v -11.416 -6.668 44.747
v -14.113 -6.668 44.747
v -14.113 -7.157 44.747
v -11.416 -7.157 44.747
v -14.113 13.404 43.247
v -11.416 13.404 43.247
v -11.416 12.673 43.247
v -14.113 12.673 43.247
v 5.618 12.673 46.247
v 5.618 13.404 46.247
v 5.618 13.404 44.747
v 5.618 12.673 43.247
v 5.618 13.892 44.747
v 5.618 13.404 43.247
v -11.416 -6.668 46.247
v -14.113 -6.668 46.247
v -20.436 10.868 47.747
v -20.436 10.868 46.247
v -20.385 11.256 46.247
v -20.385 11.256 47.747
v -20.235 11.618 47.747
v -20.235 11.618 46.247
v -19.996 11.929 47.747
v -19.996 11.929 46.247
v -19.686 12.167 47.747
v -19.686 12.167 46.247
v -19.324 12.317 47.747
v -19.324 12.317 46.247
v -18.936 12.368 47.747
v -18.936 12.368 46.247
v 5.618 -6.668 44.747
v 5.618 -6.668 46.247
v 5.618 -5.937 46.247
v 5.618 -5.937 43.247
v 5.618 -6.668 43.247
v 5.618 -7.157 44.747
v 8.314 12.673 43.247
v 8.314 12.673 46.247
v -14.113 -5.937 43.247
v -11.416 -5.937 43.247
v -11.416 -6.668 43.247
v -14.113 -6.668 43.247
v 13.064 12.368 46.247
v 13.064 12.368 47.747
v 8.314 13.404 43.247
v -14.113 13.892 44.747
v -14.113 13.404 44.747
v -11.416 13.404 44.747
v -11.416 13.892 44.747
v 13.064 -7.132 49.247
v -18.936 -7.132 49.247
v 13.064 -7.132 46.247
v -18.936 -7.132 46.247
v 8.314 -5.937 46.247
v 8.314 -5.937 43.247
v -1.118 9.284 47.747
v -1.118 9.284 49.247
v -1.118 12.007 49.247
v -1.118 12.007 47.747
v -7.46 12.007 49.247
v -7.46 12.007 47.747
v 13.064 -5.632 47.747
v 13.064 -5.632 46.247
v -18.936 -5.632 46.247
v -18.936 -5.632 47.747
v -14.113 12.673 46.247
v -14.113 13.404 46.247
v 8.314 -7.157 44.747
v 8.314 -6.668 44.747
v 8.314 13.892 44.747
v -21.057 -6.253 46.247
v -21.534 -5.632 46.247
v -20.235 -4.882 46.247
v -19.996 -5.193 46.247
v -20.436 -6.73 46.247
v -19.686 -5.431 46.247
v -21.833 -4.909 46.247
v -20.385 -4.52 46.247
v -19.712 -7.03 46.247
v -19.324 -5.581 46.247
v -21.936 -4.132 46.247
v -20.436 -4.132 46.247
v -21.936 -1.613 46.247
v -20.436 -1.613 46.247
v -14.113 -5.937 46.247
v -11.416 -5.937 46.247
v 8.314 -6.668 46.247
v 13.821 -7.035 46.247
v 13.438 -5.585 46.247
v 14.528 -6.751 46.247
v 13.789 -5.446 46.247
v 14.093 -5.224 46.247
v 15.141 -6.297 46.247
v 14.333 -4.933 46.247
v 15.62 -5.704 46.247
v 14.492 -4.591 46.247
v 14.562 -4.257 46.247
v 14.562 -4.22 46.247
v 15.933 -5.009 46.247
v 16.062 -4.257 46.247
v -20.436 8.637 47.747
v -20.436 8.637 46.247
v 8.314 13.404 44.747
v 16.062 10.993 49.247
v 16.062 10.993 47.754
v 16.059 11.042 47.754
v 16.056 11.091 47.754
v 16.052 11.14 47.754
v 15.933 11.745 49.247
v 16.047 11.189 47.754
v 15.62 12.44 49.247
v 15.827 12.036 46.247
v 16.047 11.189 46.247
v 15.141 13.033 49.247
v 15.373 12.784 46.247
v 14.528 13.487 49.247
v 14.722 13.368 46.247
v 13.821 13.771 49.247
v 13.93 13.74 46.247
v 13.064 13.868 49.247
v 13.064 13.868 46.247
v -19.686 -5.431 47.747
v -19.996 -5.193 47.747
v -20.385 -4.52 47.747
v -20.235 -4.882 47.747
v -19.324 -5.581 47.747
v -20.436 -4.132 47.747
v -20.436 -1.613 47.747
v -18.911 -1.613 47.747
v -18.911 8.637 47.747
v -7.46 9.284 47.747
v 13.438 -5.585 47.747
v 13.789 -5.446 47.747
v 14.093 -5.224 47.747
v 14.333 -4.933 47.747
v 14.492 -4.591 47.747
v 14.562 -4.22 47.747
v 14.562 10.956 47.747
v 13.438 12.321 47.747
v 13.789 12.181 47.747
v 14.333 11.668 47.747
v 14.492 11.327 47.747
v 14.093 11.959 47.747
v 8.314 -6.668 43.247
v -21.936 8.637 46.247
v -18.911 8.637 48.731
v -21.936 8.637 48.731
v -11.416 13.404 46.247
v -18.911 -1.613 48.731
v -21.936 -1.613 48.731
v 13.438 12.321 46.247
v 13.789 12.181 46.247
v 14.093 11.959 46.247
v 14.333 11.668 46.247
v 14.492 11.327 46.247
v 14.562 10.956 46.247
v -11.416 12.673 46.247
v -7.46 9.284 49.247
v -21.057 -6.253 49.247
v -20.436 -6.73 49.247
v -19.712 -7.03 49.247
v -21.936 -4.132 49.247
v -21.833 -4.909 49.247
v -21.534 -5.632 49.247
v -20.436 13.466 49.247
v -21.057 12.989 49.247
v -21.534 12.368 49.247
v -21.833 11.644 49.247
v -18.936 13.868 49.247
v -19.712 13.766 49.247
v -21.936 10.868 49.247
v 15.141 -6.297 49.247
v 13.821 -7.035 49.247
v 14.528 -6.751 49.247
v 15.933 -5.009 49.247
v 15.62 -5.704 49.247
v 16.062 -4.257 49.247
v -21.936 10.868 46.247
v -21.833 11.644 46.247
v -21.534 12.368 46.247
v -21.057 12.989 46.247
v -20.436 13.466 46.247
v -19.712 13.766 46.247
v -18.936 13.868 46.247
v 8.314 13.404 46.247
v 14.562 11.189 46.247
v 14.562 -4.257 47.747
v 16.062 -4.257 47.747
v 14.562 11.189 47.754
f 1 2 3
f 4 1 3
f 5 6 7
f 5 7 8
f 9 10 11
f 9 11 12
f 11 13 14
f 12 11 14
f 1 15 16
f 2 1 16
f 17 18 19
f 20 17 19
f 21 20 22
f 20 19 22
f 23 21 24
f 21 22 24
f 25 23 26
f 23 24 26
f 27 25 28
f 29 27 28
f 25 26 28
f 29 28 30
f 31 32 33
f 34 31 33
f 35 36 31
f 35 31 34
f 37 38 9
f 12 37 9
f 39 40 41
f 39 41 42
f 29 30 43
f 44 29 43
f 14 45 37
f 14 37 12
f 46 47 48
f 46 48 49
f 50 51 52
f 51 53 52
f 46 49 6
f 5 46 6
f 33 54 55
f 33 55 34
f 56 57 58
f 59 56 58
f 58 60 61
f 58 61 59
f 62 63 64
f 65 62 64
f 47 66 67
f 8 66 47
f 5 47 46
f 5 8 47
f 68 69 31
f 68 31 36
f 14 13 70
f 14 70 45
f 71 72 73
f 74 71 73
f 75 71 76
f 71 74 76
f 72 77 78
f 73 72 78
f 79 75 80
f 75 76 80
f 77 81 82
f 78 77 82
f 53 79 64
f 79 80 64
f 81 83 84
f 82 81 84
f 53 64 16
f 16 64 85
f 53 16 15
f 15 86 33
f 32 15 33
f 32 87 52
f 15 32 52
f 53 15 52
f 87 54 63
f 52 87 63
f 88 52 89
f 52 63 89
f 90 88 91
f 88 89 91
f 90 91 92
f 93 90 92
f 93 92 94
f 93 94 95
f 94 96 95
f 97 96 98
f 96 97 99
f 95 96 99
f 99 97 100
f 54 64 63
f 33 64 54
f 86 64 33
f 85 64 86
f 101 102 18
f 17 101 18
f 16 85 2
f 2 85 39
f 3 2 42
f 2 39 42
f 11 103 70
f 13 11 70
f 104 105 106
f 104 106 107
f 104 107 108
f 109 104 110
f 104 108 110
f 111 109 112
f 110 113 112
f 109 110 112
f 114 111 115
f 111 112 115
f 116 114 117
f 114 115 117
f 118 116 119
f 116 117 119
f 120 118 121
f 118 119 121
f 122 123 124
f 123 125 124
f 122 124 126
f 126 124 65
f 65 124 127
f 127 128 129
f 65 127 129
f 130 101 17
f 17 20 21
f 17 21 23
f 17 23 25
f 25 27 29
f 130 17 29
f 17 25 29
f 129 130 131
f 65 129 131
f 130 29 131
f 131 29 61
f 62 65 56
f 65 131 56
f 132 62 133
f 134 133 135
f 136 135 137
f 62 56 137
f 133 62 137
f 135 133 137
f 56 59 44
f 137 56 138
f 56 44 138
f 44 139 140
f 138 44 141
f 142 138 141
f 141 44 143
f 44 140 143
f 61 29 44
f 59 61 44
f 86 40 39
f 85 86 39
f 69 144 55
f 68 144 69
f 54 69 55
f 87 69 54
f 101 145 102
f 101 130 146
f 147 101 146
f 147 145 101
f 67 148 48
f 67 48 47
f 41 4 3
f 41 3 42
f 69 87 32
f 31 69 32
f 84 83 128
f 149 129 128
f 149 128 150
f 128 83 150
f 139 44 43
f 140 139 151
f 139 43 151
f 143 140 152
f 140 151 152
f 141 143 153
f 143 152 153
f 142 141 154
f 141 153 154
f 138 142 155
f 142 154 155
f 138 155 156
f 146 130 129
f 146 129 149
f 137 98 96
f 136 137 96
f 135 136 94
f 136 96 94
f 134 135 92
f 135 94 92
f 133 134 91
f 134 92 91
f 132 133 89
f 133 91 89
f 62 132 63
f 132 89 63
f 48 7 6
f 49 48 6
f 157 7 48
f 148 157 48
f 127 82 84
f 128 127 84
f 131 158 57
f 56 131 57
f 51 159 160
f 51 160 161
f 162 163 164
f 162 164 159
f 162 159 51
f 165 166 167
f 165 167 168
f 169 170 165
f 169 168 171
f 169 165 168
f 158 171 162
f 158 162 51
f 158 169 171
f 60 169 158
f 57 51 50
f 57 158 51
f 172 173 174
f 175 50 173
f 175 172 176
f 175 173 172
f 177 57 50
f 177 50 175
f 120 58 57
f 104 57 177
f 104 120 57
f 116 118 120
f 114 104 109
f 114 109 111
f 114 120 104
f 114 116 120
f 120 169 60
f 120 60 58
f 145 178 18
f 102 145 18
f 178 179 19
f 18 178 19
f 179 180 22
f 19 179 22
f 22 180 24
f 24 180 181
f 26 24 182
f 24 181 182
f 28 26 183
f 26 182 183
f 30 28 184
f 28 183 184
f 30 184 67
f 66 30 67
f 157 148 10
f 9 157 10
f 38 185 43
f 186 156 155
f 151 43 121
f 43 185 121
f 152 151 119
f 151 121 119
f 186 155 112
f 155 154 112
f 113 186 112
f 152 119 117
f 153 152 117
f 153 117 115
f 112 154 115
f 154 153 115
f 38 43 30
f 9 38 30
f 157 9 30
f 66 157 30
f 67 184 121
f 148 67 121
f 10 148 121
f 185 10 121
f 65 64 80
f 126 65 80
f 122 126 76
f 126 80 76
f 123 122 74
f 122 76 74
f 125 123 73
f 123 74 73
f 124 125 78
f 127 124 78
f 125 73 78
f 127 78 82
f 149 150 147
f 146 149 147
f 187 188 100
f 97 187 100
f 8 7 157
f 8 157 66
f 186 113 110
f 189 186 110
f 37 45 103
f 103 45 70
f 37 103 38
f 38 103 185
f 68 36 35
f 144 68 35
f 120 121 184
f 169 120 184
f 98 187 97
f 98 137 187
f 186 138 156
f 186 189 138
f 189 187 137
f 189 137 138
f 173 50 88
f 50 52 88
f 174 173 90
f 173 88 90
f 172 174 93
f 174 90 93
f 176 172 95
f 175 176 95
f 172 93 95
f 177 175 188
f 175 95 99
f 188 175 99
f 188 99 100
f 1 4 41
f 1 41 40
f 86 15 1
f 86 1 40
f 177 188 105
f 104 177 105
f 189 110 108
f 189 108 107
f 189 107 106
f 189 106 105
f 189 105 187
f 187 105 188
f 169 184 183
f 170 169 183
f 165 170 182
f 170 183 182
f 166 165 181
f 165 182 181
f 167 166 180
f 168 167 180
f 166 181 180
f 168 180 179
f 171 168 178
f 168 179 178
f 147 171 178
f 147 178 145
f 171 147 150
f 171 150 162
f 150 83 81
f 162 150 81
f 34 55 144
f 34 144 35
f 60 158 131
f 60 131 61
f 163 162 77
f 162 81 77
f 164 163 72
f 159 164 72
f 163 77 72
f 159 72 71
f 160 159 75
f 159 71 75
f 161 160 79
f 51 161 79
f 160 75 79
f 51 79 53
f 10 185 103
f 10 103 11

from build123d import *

# Parameters (mm, degrees)
EXTRUDE_1_DEPTH     = 1.5
EXTRUDE_2_DEPTH     = 1.5
CUT_EXTRUDE_2_DEPTH = 1.5
SKETCH_8_W          = 6.342405544
SKETCH_8_H          = 2.722912939
CUT_EXTRUDE_3_DEPTH = 1.5
SKETCH_9_W          = 2.696269273
SKETCH_9_H          = 0.7312398
EXTRUDE_4_DEPTH     = 3
EXTRUDE_6_REACH     = 61.436
CUT_EXTRUDE_4_DEPTH = 17.033846789
SKETCH_6_W          = 3.802870335
SKETCH_6_H          = 10.25
CUT_EXTRUDE_5_DEPTH = 3.024817901


with BuildPart() as part:
    # 草图1 → 凸台-拉伸1 (new body)
    with BuildSketch(Plane.XY.offset(46.24708128)):
        with BuildLine():
            Line((-18.935673231, -7.132078693), (13.064326769, -7.132078693))
            ThreePointArc((13.064326769, -7.132078693), (15.140982735, -6.297142202), (16.061721471, -4.257078693))
            Line((16.061721471, -4.257078693), (16.061721471, 10.992921307))
            ThreePointArc((16.061721471, 10.992921307), (15.140982735, 13.032984817), (13.064326769, 13.867921307))
            Line((13.064326769, 13.867921307), (-18.935673231, 13.867921307))
            ThreePointArc((-18.935673231, 13.867921307), (-21.056993574, 12.989241651), (-21.935673231, 10.867921307))
            Line((-21.935673231, 10.867921307), (-21.935673231, -4.132078693))
            ThreePointArc((-21.935673231, -4.132078693), (-21.056993574, -6.253399036), (-18.935673231, -7.132078693))
        make_face()
        with BuildLine():
            Line((13.064326769, -5.632078693), (-18.935673231, -5.632078693))
            ThreePointArc((-18.935673231, -5.632078693), (-19.996333403, -5.192738865), (-20.435673231, -4.132078693))
            Line((-20.435673231, -4.132078693), (-20.435673231, 10.867921307))
            ThreePointArc((-20.435673231, 10.867921307), (-19.996333403, 11.928581479), (-18.935673231, 12.367921307))
            Line((-18.935673231, 12.367921307), (13.064326769, 12.367921307))
            ThreePointArc((13.064326769, 12.367921307), (14.124986941, 11.928581479), (14.564326769, 10.867921307))
            Line((14.564326769, 10.867921307), (14.564326769, -4.132078693))
            ThreePointArc((14.564326769, -4.132078693), (14.124986941, -5.192738865), (13.064326769, -5.632078693))
        make_face(mode=Mode.SUBTRACT)
    extrude(amount=EXTRUDE_1_DEPTH)

    # 草图4 → 凸台-拉伸2 (add)
    with BuildSketch(Plane.XY.offset(47.74708128)):
        with BuildLine():
            Line((-21.935673231, 10.867921307), (-21.935673231, -4.132078693))
            ThreePointArc((-21.935673231, -4.132078693), (-21.056993574, -6.253399036), (-18.935673231, -7.132078693))
            Line((-18.935673231, -7.132078693), (13.064326769, -7.132078693))
            ThreePointArc((13.064326769, -7.132078693), (15.140982735, -6.297142202), (16.061721471, -4.257078693))
            Line((16.061721471, -4.257078693), (16.061721471, 10.992921307))
            ThreePointArc((16.061721471, 10.992921307), (15.140982735, 13.032984817), (13.064326769, 13.867921307))
            Line((13.064326769, 13.867921307), (-18.935673231, 13.867921307))
            ThreePointArc((-18.935673231, 13.867921307), (-21.056993574, 12.989241651), (-21.935673231, 10.867921307))
        make_face()
    extrude(amount=EXTRUDE_2_DEPTH)

    # 草图7 → 切除-拉伸2 (cut)
    with BuildSketch(Plane(origin=(16.061721471, 0, 0), x_dir=(0, 0, -1), z_dir=(1, 0, 0))):
        Polygon((-46.24708128, 11.189366068), (-47.753743169, 11.189366068), (-47.74708128, -4.257078693), (-46.24708128, -4.257078693), align=None)
    extrude(amount=-CUT_EXTRUDE_2_DEPTH, mode=Mode.SUBTRACT)

    # 草图8 → 切除-拉伸3 (cut)
    with BuildSketch(Plane.XY.offset(49.24708128)):
        with Locations((-4.288714371, 10.645412295)):
            Rectangle(SKETCH_8_W, SKETCH_8_H)
    extrude(amount=-CUT_EXTRUDE_3_DEPTH, mode=Mode.SUBTRACT)

    # 草图9 → 凸台-拉伸4 (add)
    with BuildSketch(Plane(origin=(0, 0, 46.24708128), x_dir=(-1, 0, 0), z_dir=(0, 0, -1))):
        with Locations((-6.965713307, 13.038581452)):
            Rectangle(SKETCH_9_W, SKETCH_9_H)
        with Locations((12.764402756, 13.038581452)):
            Rectangle(SKETCH_9_W, SKETCH_9_H)
        with Locations((12.764402756, -6.302738837)):
            Rectangle(SKETCH_9_W, SKETCH_9_H)
        with Locations((-6.965713307, -6.302738837)):
            Rectangle(SKETCH_9_W, SKETCH_9_H)
    extrude(amount=EXTRUDE_4_DEPTH)

    # 凸台-拉伸6: up to this face of the body (flat: up to its plane)
    extrude_6_end = Plane(part.part.faces().sort_by_distance((-14.112537392, 13.038581452, 44.74708128))[0])
    # 草图10 → 凸台-拉伸6 (add, up to the picked face)
    with BuildSketch(Plane(origin=(8.313847943, 0, 0), x_dir=(0, 0, -1), z_dir=(1, 0, 0)), mode=Mode.PRIVATE) as extrude_6_sk1:
        Polygon((-44.74708128, 13.404201352), (-44.74708128, 13.89248872), (-43.24708128, 13.404201352), align=None)
    extrude_6_tool1 = split(extrude(extrude_6_sk1.sketch, amount=-EXTRUDE_6_REACH, mode=Mode.PRIVATE), bisect_by=extrude_6_end, keep=Keep.BOTH, mode=Mode.PRIVATE)
    extrude_6 = extrude_6_tool1.solids().sort_by(Axis((8.313848, 13.566964, 44.247081), (-1, 0, 0)))[0]
    add(extrude_6)

    # 草图11 → 切除-拉伸4 (cut)
    with BuildSketch(Plane(origin=(-11.416268119, 0, 0), x_dir=(0, 0, -1), z_dir=(1, 0, 0))):
        Polygon((-44.74708128, 13.404201352), (-43.24708128, 13.404201352), (-44.74708128, 13.89248872), align=None)
    cut_extrude_4 = extrude(amount=CUT_EXTRUDE_4_DEPTH, mode=Mode.SUBTRACT)

    # 镜向1: 凸台-拉伸6 across plane
    add(extrude_6.mirror(Plane(origin=(0, 3.367921307, 0), x_dir=(0, 0, 1), z_dir=(0, -1, 0))))

    # 镜向2: 切除-拉伸4 across plane
    add(cut_extrude_4.mirror(Plane(origin=(0, 3.367921307, 0), x_dir=(0, 0, 1), z_dir=(0, -1, 0))), mode=Mode.SUBTRACT)

    # 草图6 → 切除-拉伸5 (cut)
    with BuildSketch(Plane.ZY.offset(21.935673231)):
        with Locations((46.829796448, 3.511921307)):
            Rectangle(SKETCH_6_W, SKETCH_6_H)
    extrude(amount=-CUT_EXTRUDE_5_DEPTH, mode=Mode.SUBTRACT)


solid = part.part
